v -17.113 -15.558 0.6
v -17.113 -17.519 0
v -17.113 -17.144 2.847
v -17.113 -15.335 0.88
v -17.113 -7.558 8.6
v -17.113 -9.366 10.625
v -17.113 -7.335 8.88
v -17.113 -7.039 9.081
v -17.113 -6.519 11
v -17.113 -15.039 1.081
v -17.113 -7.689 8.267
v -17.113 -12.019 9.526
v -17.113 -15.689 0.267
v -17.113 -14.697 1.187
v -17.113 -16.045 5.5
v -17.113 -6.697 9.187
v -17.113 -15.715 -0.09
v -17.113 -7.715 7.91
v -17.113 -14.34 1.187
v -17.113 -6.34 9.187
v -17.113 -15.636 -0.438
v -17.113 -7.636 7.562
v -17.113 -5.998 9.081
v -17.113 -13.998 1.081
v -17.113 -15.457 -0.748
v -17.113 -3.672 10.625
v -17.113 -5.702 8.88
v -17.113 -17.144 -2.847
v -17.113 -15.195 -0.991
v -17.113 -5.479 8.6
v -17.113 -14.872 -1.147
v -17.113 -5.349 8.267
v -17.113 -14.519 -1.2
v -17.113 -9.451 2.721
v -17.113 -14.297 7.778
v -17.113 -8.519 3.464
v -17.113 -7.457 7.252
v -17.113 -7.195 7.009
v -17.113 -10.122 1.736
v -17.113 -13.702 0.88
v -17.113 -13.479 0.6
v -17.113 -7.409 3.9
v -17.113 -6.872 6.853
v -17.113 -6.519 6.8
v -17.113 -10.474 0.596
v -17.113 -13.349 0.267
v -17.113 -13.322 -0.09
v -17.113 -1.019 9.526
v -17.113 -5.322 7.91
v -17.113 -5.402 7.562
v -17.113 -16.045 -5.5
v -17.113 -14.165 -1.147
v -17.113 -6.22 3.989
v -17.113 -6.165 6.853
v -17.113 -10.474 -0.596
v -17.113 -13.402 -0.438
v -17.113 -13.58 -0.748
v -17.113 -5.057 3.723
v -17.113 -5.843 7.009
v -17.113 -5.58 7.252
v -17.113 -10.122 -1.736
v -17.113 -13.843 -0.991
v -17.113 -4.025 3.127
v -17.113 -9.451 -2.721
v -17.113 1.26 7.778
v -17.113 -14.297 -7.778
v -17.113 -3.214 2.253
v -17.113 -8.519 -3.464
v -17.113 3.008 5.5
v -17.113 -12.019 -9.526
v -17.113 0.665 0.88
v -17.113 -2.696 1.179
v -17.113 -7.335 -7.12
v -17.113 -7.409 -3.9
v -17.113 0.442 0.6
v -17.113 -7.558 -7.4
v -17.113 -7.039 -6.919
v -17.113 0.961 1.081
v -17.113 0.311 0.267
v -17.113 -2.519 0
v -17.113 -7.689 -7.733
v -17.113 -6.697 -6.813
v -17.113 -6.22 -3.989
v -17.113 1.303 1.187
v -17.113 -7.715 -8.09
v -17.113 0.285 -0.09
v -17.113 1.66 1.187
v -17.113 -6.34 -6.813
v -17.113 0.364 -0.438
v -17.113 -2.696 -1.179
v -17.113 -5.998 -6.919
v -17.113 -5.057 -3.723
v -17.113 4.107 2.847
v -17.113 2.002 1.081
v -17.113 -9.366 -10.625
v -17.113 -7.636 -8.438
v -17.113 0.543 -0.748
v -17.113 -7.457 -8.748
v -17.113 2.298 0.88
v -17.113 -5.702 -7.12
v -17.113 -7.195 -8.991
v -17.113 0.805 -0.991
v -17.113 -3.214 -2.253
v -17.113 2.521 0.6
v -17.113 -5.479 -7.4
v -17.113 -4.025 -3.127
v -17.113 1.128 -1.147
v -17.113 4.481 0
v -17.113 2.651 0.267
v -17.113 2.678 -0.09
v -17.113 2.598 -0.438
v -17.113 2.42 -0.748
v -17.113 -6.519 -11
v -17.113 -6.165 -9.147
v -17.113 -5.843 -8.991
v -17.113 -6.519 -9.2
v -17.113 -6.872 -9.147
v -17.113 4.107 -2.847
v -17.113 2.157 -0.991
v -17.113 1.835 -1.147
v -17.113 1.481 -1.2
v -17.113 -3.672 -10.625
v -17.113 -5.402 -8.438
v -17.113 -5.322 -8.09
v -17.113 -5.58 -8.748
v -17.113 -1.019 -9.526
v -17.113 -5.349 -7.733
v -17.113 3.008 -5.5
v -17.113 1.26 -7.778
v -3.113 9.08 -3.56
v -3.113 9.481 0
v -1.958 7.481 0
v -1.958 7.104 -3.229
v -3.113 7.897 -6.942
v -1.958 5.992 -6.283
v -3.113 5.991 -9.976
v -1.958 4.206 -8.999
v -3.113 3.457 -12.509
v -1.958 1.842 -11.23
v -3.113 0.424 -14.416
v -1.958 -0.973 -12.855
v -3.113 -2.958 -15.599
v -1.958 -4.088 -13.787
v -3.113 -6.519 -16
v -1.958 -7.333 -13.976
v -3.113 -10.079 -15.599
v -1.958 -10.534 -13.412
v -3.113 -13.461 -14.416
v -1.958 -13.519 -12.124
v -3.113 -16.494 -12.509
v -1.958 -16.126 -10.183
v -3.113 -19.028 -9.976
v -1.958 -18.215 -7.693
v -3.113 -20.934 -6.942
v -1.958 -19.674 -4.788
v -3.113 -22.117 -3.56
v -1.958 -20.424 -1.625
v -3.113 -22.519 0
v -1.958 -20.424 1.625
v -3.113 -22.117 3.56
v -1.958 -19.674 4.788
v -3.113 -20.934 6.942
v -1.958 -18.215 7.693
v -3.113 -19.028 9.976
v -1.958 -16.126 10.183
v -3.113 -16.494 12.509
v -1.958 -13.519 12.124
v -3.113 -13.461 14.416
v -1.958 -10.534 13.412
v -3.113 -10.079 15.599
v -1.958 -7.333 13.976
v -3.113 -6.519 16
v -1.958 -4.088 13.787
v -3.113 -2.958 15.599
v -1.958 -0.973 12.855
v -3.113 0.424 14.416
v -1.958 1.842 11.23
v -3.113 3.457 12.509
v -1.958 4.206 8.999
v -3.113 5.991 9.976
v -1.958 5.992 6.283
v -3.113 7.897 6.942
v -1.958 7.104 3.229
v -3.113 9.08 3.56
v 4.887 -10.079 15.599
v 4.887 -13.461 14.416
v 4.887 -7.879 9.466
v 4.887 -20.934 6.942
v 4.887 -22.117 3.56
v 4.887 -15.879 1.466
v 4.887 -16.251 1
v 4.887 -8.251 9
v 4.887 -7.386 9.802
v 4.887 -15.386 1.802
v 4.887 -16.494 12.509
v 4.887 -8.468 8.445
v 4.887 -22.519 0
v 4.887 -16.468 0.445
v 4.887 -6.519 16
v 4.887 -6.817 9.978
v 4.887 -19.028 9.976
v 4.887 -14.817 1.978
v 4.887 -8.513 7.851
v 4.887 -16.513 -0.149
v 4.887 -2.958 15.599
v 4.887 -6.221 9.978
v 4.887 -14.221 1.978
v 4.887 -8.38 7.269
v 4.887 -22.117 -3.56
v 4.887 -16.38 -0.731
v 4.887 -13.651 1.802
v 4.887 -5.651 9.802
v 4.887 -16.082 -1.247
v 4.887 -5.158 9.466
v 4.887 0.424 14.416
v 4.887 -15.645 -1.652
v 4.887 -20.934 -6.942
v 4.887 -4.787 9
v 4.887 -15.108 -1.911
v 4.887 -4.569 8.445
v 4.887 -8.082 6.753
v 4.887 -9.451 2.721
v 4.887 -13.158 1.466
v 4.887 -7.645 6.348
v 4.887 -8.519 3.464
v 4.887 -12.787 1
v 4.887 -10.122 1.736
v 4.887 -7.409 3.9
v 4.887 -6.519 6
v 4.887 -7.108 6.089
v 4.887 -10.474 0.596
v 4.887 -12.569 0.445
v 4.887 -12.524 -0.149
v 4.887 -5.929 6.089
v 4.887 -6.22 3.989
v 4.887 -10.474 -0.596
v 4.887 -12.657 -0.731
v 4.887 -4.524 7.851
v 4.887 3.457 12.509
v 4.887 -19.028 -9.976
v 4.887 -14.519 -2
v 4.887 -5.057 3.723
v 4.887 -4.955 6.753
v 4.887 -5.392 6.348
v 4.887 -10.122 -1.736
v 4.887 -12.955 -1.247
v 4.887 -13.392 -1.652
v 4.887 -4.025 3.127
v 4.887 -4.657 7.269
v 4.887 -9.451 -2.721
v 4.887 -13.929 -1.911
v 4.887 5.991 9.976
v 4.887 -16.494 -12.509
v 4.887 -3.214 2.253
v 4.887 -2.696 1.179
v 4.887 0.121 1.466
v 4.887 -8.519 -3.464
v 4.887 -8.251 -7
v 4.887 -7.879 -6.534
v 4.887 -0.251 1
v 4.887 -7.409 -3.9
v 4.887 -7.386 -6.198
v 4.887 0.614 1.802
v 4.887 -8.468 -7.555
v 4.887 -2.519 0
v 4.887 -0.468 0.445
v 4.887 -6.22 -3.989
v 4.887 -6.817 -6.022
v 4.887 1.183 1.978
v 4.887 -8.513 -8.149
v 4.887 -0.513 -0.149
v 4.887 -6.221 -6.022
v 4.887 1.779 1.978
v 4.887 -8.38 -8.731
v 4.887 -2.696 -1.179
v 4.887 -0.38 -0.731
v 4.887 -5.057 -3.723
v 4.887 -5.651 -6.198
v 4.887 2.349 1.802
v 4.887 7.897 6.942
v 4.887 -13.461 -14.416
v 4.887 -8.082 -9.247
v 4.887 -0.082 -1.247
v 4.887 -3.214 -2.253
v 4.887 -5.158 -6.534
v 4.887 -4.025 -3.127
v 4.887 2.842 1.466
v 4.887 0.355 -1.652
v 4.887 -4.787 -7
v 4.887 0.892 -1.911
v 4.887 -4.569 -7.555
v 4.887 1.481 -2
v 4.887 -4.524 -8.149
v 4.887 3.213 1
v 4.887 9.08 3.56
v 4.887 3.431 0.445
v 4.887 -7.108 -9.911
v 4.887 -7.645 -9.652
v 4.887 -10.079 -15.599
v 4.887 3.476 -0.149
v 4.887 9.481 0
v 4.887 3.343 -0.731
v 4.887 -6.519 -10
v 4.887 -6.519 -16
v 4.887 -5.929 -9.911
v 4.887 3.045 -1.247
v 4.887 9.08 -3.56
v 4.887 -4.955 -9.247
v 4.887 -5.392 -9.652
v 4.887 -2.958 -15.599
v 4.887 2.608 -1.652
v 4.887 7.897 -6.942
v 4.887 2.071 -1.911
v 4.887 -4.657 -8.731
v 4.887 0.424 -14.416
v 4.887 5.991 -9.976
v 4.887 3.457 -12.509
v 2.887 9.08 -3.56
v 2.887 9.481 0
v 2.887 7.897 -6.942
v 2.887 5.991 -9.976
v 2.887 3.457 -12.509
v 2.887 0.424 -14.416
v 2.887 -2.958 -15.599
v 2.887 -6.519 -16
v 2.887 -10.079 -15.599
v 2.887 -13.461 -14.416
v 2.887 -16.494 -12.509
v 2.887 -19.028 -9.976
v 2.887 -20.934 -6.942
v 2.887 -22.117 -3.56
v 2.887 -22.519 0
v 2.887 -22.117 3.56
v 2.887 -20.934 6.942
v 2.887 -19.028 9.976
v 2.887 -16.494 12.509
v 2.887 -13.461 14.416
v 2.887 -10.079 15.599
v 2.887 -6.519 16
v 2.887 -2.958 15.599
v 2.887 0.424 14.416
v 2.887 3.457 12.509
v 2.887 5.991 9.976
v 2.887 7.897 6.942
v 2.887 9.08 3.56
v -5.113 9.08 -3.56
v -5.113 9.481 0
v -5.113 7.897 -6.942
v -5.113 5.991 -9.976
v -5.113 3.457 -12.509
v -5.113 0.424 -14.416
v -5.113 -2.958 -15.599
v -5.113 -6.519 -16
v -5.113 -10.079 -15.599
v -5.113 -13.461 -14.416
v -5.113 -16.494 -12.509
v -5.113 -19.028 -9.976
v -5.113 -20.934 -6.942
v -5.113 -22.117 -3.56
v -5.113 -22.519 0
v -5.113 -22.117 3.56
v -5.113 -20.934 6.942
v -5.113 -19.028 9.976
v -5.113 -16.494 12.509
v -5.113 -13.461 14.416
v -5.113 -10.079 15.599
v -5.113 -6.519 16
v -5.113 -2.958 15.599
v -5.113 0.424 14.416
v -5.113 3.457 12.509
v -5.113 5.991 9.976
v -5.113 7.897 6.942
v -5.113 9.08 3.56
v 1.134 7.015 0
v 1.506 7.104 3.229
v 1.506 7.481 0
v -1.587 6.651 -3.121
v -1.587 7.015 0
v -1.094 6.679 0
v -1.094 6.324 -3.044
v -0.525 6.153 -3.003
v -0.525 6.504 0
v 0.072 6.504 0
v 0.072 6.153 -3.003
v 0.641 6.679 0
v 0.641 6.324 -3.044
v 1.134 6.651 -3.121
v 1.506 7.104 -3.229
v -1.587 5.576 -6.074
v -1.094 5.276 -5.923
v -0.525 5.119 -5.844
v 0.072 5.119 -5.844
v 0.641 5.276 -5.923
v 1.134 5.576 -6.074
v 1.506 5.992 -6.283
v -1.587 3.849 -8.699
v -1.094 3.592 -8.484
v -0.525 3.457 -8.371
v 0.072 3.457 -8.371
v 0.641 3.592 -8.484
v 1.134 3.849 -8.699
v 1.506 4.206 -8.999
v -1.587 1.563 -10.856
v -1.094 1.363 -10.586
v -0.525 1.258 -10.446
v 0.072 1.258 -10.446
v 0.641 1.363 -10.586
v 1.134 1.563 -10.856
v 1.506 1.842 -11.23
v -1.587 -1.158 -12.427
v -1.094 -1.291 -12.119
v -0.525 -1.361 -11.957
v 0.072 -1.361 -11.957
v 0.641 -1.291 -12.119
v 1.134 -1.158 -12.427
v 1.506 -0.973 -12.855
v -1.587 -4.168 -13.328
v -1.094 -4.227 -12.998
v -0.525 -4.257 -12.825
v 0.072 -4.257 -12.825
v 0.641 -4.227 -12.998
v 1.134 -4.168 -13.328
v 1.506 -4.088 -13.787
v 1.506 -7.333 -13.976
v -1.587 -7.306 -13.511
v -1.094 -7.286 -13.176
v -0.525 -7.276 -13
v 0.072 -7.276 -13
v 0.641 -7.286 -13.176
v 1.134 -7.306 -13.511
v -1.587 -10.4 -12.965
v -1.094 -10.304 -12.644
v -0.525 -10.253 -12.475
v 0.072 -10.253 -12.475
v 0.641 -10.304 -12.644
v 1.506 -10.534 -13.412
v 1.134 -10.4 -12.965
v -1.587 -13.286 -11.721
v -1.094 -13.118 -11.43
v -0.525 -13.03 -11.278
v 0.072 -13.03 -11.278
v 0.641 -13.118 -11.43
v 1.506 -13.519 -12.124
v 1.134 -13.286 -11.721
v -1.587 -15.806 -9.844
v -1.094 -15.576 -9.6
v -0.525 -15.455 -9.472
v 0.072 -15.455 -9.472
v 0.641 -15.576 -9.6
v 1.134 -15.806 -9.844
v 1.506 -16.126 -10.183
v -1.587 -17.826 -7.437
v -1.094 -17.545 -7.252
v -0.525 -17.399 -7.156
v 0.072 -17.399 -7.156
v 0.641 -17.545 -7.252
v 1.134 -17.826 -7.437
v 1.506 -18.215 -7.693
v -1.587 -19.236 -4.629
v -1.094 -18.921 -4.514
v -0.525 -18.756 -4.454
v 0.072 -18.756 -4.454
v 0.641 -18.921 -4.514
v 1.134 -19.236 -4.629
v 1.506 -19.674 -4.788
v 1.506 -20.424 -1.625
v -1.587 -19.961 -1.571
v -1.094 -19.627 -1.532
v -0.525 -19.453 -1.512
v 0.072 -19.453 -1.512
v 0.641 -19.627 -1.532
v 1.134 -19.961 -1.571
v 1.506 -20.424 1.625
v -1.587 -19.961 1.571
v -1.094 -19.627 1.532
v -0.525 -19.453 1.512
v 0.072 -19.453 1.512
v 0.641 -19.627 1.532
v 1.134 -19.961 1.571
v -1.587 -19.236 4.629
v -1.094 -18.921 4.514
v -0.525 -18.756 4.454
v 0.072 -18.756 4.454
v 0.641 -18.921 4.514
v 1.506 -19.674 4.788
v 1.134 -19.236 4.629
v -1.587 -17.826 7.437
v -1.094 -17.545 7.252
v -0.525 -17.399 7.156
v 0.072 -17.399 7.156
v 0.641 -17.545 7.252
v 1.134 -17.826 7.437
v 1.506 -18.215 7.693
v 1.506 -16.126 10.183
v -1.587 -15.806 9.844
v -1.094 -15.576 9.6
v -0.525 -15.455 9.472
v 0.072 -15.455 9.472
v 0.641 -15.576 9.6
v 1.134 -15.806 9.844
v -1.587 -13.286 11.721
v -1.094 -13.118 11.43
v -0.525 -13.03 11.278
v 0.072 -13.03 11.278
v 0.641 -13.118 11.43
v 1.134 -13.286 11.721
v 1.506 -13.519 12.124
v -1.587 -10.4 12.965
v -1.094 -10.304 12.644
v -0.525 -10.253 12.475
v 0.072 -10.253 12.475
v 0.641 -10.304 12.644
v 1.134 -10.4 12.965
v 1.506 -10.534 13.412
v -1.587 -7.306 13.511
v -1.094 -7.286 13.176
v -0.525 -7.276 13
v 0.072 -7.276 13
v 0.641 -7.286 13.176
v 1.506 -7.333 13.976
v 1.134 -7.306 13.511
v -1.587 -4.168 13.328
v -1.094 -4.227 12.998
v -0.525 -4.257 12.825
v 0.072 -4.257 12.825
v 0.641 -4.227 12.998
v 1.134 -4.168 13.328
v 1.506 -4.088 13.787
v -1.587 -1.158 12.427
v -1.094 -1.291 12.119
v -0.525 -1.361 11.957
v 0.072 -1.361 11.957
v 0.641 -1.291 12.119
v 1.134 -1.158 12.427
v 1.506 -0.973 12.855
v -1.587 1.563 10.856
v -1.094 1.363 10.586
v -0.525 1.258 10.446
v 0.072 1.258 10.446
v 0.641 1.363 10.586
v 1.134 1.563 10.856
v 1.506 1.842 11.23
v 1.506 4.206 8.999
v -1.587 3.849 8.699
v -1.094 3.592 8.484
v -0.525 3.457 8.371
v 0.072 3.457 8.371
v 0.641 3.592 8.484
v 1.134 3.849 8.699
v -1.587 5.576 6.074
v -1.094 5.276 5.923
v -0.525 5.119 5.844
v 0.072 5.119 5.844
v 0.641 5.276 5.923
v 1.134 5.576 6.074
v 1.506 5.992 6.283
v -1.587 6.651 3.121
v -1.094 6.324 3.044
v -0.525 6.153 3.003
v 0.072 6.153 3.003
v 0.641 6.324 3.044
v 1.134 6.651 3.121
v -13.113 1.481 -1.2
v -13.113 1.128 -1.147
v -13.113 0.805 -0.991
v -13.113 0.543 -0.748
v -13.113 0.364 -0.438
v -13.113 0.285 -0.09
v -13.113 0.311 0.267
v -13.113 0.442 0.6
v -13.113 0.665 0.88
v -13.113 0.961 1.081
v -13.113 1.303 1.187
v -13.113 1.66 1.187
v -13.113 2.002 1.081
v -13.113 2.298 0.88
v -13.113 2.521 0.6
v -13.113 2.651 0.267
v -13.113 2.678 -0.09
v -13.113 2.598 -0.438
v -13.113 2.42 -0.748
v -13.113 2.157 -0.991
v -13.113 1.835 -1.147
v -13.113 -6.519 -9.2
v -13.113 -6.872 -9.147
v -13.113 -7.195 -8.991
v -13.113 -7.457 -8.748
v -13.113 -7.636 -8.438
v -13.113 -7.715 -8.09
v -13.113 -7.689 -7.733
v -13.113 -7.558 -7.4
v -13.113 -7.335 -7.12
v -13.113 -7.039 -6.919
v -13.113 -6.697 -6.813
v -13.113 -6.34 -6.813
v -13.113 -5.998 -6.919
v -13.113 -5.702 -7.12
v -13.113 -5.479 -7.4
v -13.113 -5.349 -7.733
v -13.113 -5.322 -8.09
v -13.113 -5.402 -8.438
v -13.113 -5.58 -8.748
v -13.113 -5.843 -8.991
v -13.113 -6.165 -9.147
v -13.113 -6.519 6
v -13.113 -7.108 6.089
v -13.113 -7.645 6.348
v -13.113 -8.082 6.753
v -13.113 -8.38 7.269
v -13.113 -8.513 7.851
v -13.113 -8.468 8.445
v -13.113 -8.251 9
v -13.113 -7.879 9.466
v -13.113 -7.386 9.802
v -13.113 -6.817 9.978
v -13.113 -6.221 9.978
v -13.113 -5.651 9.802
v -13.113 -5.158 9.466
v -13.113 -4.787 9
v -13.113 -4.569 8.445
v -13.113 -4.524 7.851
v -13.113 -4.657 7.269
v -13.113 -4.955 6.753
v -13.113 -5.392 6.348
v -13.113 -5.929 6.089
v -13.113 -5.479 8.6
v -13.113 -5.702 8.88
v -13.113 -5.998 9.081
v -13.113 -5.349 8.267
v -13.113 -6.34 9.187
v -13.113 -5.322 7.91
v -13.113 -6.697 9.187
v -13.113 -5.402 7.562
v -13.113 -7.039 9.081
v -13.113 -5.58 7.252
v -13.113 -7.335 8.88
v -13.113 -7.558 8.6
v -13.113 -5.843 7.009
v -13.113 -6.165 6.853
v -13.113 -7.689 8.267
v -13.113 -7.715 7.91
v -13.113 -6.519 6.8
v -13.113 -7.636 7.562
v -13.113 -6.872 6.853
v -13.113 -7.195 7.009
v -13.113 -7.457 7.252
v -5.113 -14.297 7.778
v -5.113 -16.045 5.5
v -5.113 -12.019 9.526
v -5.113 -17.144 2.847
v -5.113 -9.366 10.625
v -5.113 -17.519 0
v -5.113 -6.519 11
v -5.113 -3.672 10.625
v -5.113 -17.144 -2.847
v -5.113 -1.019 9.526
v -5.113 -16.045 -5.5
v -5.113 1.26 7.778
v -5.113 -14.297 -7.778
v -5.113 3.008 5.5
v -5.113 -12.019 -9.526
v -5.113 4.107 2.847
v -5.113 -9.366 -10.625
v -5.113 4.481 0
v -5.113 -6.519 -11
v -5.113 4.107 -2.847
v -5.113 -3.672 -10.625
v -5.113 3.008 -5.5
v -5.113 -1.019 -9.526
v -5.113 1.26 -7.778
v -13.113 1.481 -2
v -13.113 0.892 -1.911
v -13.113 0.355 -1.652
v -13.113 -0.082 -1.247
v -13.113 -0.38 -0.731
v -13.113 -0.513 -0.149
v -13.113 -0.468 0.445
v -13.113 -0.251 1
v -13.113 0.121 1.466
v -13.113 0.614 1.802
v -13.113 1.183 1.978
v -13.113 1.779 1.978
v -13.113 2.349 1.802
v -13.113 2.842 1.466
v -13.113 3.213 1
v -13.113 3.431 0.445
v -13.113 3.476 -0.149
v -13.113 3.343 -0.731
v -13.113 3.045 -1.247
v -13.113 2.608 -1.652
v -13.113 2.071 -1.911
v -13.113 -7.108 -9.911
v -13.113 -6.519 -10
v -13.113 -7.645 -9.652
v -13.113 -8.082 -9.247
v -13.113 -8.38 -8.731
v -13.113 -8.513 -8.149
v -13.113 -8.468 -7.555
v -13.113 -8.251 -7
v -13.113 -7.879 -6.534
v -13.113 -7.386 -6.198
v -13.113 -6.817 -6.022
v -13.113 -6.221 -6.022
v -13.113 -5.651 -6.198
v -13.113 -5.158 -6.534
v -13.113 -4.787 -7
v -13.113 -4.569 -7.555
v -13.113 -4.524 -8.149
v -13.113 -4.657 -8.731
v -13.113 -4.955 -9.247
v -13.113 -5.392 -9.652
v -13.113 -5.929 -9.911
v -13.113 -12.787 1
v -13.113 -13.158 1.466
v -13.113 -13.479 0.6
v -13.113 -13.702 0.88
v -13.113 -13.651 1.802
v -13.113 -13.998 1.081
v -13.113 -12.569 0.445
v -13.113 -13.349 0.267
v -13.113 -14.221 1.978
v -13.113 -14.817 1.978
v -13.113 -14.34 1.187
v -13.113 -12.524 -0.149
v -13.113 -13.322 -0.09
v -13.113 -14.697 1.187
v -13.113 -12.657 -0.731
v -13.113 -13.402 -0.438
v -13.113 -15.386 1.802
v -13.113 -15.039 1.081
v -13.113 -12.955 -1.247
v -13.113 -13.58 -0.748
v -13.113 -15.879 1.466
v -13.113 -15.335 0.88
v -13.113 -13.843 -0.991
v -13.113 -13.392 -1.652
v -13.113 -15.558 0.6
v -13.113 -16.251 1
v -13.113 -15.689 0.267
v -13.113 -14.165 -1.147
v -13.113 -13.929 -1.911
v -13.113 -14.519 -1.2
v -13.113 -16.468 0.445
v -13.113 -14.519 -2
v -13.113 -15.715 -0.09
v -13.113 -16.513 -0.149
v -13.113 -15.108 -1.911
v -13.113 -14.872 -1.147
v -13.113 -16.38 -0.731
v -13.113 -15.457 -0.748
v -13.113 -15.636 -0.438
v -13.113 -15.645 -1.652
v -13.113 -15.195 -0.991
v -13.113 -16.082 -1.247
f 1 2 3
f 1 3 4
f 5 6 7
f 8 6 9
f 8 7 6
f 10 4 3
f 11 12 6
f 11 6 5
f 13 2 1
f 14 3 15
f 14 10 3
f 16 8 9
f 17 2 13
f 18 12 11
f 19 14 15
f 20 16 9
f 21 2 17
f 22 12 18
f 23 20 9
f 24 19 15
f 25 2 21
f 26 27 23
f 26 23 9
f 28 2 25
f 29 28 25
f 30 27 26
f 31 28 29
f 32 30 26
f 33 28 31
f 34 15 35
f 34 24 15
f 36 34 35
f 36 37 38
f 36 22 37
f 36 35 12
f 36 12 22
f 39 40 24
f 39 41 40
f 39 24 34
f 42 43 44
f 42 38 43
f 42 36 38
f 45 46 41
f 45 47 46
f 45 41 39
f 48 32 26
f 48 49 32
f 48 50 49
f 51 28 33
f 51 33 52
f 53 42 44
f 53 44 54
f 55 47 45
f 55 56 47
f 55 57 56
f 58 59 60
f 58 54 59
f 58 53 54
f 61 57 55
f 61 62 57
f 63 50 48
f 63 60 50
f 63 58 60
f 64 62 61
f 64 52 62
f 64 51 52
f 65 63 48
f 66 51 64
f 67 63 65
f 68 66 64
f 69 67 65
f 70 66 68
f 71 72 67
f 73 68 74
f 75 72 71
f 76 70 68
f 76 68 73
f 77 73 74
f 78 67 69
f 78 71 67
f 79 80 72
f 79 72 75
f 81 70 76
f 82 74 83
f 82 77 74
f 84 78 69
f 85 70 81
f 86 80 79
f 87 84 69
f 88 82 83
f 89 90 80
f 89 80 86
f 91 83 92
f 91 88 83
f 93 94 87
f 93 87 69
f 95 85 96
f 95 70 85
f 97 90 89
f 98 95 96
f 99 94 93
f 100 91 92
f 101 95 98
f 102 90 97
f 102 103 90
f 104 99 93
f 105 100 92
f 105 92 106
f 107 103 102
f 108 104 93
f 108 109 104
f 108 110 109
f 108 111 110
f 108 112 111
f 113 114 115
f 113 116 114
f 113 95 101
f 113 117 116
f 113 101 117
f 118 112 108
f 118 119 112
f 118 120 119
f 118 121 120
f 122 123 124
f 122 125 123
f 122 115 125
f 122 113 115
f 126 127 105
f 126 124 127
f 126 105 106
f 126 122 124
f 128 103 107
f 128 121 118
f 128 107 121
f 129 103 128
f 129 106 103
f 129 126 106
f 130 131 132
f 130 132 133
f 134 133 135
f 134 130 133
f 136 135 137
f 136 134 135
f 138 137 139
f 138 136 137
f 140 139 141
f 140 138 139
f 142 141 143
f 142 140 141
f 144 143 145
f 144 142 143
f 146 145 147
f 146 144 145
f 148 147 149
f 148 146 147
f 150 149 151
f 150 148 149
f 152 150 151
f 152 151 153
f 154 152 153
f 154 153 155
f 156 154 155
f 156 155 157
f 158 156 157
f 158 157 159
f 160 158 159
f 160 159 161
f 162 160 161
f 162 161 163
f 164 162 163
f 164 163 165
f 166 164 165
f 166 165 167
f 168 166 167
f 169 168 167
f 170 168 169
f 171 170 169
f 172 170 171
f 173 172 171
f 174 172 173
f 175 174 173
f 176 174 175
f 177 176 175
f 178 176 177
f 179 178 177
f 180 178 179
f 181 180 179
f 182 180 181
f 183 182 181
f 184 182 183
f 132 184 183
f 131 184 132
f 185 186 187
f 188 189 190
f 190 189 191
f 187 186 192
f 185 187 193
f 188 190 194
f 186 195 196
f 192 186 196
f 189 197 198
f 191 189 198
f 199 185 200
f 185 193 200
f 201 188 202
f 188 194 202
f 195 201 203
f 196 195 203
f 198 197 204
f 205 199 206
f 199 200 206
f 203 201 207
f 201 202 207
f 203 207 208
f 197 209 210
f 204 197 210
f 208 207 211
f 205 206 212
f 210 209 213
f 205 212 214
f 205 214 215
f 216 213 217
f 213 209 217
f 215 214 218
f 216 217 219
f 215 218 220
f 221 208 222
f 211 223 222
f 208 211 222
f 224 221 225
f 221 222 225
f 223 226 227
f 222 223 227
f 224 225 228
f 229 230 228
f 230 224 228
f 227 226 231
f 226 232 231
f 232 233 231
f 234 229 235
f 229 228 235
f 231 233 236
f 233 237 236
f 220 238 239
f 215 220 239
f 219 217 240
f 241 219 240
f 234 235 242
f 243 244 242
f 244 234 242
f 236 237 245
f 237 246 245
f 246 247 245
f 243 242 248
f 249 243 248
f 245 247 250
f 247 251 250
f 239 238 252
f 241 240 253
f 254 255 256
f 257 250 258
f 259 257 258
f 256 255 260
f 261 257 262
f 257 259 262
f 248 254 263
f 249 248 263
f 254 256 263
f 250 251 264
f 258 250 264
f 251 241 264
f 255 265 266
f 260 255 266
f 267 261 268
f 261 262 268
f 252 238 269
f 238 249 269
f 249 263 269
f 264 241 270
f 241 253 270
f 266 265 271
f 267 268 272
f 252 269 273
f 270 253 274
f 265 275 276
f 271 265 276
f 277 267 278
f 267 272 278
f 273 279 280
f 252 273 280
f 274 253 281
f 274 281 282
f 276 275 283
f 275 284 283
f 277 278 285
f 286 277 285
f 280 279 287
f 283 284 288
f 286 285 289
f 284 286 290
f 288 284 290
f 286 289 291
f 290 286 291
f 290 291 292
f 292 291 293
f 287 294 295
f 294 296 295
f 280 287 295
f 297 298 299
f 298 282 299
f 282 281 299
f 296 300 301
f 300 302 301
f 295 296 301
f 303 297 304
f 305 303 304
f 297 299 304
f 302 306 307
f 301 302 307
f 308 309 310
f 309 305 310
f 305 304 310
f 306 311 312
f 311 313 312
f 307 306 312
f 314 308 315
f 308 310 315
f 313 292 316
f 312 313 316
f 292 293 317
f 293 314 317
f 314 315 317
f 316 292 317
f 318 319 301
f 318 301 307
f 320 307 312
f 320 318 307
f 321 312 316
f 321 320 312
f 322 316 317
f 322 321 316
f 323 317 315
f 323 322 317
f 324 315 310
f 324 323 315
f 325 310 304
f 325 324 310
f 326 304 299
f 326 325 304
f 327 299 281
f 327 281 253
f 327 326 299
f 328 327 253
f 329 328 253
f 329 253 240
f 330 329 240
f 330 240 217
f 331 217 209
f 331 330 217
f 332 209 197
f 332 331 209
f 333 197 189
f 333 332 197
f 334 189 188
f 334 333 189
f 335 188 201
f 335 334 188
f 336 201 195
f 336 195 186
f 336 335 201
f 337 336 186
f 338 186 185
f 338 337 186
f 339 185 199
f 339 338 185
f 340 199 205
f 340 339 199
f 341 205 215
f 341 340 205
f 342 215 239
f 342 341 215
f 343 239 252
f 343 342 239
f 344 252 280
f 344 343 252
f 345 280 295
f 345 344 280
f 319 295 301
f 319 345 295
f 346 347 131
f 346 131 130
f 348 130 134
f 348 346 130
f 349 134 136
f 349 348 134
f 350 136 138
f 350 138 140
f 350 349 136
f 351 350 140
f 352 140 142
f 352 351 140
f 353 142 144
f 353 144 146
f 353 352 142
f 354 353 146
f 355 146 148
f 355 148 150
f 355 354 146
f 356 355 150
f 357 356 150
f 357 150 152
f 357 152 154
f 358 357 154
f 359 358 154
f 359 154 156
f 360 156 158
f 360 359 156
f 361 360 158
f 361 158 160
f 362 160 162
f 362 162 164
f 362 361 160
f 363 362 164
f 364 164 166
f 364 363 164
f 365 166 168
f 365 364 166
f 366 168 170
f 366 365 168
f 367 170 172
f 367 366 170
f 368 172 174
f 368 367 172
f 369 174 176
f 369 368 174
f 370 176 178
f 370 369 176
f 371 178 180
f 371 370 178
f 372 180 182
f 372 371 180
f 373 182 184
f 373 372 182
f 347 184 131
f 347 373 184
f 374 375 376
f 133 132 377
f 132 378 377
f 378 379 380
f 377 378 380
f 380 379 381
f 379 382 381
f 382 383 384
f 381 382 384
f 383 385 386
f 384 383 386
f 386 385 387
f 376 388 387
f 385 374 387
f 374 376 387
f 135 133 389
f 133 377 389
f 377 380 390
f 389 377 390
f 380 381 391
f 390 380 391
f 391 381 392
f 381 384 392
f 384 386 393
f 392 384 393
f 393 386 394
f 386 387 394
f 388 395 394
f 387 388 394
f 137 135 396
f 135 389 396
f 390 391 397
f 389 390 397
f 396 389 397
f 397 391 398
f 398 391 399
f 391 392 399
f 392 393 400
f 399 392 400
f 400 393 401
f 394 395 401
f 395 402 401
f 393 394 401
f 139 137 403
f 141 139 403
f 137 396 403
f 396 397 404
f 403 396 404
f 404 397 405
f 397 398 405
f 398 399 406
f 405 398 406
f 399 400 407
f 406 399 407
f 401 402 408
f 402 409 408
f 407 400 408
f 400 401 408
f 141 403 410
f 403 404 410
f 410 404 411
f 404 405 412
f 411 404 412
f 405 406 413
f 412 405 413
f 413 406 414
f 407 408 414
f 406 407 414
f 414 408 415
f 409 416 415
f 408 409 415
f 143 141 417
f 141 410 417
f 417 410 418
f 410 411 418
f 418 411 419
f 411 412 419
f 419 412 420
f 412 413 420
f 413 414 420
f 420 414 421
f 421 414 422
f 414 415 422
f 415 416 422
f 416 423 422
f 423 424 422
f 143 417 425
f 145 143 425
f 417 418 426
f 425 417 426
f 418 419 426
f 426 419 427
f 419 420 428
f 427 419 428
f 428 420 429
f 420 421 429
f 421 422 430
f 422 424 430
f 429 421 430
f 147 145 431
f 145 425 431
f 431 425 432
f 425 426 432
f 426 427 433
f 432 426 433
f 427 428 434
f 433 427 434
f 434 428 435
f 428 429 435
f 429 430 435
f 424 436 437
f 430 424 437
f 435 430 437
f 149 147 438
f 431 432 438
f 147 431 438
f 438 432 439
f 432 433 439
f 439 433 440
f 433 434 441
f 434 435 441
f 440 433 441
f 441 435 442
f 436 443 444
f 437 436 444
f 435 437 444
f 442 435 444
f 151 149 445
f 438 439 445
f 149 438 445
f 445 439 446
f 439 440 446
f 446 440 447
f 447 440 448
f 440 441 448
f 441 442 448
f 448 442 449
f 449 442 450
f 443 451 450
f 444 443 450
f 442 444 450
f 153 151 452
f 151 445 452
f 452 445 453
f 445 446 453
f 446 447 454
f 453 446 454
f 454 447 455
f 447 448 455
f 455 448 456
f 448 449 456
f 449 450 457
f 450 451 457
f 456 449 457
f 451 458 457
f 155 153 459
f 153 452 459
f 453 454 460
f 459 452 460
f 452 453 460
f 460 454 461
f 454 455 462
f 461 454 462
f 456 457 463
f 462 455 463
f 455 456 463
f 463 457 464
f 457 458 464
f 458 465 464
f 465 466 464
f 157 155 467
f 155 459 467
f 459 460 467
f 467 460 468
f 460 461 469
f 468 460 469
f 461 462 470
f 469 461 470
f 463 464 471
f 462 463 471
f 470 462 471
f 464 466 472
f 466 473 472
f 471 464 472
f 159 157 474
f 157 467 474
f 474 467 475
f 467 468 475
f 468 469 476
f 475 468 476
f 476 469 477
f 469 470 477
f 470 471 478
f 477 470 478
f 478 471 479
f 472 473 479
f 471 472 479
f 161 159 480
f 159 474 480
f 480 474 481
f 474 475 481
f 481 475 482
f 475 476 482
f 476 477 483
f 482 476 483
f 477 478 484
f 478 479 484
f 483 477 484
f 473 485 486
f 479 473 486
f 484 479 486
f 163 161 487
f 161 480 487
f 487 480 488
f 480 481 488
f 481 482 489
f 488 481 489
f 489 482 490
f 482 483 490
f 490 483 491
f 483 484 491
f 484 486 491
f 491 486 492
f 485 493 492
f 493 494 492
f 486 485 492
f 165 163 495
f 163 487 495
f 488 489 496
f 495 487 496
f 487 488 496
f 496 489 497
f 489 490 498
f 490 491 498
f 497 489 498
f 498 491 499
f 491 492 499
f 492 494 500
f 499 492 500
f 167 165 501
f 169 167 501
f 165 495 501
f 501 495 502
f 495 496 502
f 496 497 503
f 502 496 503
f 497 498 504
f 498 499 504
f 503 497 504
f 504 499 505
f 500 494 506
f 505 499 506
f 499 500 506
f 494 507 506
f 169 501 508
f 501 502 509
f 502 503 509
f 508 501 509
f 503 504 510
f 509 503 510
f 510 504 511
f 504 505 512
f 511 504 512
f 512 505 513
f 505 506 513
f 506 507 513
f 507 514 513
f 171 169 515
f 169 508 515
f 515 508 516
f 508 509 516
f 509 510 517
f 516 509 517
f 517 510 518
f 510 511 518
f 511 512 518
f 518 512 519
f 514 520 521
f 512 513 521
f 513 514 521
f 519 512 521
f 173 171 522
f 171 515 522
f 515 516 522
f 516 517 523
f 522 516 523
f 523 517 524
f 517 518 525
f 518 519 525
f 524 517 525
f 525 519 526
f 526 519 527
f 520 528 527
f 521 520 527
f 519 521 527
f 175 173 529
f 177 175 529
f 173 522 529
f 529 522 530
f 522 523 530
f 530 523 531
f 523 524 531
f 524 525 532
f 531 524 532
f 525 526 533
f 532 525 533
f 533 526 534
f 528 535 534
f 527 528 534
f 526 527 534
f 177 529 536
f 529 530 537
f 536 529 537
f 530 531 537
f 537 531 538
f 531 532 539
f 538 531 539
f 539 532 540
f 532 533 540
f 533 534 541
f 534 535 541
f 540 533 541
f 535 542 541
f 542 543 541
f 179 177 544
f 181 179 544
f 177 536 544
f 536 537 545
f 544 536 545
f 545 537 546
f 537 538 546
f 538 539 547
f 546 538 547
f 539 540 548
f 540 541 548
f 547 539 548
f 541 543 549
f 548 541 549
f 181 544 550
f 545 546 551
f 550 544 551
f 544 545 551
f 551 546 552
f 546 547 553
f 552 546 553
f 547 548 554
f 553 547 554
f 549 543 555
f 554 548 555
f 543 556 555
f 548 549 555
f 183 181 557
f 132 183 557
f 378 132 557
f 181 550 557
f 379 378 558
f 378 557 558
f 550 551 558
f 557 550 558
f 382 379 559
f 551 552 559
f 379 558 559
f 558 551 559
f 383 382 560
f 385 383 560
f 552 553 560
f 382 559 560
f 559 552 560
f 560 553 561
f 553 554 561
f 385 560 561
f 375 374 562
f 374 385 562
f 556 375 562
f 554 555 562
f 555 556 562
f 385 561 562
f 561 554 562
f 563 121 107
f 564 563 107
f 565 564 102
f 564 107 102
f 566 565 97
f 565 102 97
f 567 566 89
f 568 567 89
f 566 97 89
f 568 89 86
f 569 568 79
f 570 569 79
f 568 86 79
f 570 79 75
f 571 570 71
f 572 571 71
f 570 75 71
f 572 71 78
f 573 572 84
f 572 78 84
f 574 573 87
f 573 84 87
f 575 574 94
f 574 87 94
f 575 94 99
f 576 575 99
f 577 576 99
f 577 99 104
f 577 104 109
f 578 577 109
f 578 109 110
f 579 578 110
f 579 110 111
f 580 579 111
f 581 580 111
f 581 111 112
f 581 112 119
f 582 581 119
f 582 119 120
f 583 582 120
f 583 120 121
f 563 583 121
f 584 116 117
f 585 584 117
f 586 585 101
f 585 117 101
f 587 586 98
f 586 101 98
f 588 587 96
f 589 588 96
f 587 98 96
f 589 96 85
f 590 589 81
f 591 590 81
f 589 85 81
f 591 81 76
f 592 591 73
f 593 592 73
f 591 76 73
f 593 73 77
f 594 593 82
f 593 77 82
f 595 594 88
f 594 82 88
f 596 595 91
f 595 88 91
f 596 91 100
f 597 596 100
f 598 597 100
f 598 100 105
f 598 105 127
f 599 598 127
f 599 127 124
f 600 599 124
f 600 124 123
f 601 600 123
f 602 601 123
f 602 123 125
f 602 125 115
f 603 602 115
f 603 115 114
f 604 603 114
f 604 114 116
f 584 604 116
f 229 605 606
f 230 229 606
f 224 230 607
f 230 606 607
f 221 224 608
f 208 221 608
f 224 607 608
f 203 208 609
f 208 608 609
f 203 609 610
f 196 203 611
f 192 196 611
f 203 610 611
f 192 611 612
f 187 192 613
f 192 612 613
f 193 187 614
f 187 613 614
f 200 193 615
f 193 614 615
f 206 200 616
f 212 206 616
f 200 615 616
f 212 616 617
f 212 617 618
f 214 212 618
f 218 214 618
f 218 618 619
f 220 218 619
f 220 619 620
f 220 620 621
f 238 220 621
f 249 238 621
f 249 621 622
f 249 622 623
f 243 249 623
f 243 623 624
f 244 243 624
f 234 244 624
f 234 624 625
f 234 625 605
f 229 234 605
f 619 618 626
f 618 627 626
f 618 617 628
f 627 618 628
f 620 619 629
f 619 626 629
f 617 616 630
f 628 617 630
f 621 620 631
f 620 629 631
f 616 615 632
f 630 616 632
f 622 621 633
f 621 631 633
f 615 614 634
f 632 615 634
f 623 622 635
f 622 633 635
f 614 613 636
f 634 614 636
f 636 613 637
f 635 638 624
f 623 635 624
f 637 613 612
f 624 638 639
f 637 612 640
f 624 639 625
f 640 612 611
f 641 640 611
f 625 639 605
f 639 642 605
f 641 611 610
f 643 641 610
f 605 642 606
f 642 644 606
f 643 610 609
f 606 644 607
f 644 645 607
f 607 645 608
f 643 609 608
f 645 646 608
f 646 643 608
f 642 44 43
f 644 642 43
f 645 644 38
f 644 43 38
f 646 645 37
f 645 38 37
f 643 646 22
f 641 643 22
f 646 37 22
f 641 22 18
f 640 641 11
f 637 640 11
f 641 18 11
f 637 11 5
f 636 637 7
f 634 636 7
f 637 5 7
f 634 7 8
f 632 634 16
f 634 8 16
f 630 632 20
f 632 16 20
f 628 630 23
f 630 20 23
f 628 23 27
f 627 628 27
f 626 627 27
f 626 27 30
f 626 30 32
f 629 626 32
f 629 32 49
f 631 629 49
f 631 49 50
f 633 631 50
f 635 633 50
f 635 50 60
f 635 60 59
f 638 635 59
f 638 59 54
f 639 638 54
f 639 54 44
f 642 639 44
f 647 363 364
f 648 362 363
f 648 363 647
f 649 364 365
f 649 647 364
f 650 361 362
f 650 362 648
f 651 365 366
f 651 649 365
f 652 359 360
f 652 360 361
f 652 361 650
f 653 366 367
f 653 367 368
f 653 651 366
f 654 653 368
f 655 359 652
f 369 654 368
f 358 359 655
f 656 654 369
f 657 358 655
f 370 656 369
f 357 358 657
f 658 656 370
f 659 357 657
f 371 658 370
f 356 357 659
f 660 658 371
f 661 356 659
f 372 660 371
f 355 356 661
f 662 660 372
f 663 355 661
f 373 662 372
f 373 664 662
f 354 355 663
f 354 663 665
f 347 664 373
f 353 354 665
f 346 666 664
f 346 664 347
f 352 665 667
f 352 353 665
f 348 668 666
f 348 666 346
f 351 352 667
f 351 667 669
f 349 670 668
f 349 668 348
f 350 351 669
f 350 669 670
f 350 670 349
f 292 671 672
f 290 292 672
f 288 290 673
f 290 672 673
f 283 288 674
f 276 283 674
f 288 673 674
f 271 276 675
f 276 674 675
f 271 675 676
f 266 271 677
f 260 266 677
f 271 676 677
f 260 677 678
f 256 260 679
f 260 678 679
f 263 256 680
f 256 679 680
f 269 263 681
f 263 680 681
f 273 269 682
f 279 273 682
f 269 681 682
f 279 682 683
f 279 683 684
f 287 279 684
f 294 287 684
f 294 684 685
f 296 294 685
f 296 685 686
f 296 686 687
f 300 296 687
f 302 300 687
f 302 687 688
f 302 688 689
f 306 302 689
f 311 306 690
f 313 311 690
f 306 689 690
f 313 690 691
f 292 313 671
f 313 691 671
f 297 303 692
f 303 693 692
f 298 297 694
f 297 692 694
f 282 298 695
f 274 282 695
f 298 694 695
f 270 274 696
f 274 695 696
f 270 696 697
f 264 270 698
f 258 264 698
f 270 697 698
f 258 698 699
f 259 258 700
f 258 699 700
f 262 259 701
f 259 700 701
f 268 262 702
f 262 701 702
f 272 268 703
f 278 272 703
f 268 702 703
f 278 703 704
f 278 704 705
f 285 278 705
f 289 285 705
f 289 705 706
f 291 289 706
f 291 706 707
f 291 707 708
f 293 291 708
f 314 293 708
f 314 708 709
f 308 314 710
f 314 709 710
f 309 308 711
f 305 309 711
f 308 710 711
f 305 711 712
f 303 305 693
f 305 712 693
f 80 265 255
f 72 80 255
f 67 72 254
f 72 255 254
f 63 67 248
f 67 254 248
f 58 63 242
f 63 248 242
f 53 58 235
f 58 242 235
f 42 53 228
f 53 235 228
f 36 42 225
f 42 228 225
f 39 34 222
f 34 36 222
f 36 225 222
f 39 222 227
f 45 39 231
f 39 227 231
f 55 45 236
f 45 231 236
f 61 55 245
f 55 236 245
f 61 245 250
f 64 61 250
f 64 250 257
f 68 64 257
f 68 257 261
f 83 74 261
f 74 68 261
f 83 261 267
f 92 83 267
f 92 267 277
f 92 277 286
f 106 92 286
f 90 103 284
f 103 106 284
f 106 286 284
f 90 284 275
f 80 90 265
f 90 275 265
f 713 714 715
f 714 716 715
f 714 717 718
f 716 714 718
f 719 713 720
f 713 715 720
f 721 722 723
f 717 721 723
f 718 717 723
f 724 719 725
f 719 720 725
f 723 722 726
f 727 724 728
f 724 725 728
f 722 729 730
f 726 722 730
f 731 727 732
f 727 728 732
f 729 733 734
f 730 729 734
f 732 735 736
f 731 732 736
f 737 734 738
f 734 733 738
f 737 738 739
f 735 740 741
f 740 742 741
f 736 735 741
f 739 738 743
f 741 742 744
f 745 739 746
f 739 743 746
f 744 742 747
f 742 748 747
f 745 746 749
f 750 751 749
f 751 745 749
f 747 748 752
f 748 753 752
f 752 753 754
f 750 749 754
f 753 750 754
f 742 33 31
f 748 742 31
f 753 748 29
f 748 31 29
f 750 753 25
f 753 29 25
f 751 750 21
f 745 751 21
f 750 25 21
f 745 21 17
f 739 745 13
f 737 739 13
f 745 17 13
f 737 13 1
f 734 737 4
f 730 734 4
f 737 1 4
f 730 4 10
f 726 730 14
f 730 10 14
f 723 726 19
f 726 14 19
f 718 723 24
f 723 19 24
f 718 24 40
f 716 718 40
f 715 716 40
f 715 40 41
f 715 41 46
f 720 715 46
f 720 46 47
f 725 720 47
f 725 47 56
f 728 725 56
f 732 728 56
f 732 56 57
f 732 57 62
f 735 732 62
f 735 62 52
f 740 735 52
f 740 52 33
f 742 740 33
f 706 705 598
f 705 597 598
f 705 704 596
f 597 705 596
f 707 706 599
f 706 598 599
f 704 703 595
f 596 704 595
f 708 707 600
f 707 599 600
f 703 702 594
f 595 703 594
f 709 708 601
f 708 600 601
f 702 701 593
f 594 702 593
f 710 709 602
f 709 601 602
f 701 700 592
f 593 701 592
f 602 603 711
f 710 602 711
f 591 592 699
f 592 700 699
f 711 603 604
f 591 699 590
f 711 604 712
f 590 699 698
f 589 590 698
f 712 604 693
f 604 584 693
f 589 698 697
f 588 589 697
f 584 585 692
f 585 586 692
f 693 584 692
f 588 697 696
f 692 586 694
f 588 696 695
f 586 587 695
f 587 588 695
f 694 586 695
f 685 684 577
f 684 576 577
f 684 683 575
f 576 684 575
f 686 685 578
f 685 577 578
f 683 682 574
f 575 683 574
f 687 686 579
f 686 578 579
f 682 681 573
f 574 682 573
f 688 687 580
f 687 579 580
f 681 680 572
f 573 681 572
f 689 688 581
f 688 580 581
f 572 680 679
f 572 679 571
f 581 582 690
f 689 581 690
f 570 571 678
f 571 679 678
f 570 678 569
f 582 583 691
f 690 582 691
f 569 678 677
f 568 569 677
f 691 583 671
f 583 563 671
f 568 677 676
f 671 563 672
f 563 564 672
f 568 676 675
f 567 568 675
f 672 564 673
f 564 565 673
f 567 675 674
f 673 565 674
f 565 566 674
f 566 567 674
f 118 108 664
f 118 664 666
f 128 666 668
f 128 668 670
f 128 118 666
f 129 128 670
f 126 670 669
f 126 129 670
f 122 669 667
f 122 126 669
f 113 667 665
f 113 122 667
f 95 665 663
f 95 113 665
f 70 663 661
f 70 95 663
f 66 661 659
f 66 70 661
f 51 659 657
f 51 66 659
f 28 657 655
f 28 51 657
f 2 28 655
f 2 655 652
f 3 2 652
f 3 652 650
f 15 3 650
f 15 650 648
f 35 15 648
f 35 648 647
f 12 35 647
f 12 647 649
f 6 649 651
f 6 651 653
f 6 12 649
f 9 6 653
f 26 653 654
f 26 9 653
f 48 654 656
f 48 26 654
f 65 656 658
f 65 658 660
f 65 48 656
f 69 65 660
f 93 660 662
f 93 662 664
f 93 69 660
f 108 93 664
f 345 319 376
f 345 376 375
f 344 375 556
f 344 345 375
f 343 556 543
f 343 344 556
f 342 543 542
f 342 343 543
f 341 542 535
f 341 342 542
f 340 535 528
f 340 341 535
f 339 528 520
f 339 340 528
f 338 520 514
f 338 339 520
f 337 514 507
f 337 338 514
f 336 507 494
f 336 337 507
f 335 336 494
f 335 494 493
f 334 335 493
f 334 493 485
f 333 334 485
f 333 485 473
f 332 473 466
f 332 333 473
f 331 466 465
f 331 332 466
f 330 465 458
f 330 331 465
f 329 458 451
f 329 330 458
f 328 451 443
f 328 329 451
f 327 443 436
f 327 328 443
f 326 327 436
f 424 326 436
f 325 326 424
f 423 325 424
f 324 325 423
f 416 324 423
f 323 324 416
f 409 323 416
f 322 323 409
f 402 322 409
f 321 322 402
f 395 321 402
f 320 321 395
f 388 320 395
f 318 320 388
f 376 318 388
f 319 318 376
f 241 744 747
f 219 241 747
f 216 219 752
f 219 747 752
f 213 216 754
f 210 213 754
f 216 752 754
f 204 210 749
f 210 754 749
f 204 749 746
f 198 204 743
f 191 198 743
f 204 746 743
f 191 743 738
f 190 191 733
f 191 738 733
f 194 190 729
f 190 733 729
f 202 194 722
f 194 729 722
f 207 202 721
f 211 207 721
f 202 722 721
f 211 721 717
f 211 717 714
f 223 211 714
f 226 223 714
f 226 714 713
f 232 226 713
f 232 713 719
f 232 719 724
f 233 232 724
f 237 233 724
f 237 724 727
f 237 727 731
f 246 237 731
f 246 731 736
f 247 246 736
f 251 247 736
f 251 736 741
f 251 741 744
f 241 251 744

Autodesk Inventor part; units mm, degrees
ref_plane "YZ Plane" through (0, 0, 0) normal (1, 0, 0) x (0, 1, 0)
ref_plane "XZ Plane" through (0, 0, 0) normal (0, 1, 0) x (-1, 0, 0)
ref_plane "XY Plane" through (0, 0, 0) normal (0, 0, 1) x (1, 0, 0)
sketch "Sketch1" plane through (0, 0, 0) normal (0, 0, 1) x (1, 0, 0)
  line L0 (4.9734, -6.5186) -> (-5.17, -6.5186) construction
  line L1 (-5.1132, 9.4814) -> (-5.1132, 4.4814)
  line L2 (-5.1132, -2.5186) -> (4.8868, -2.5186)
  line L3 (4.8868, 9.4814) -> (2.8868, 9.4814)
  line L4 (2.8868, 9.4814) -> (1.5056, 7.4814)
  arc A0 (-1.9585, 7.4814) -> (1.5056, 7.4814) centre (-0.2265, 8.4814) ccw
  line L5 (-1.9585, 7.4814) -> (-3.1132, 9.4814)
  line L6 (-3.1132, 9.4814) -> (-5.1132, 9.4814)
  line L7 (4.8868, 9.4814) -> (4.8868, -2.5186)
  line L8 (-5.1132, 4.4814) -> (-17.1132, 4.4814)
  line L9 (-17.1132, 4.4814) -> (-17.1132, -2.5186)
  line L10 (-17.1132, -2.5186) -> (-5.1132, -2.5186)
  dimension "d28" = 2
  dimension "d29" = 120
  dimension "d30" = 12
  dimension "d31" = 10
  dimension "d32" = 4
  dimension "d33" = 2
  dimension "d34" = 2
  dimension "d35" = 2
  dimension "d36" = 2
  dimension "d45" = 12
  dimension "d48" = 11
revolve "Revolution1" add sketch "Sketch1" angle 360 about axis through (4.9734, -6.5186, 0) along (-1, 0, 0)
sketch "Sketch3" plane through (4.8868, -6.5186, 0) normal (1, 0, 0) x (0, 0, -1)
  circle A0 centre (0, 0) radius 4 projected
  line L0 (0, 0) -> (-8, 0) construction
  point P0 (0, 6.5186)
  point P1 (0, -8)
  point P2 (8, 0)
  point P3 (0, 8)
  dimension "d49" = 8
  dimension "d52" = 360
hole "Hole2" at (4.8868, -6.5186, 0) at (4.8868, -6.5186, 8) at (4.8868, -14.5186, 0) at (4.8868, -6.5186, -8) at (4.8868, 1.4814, 0) direction (-1, 0, 0) diameter 2.4 end through all counterbore diameter 4 counterbore depth 18
properties part number "motor_trinse"
